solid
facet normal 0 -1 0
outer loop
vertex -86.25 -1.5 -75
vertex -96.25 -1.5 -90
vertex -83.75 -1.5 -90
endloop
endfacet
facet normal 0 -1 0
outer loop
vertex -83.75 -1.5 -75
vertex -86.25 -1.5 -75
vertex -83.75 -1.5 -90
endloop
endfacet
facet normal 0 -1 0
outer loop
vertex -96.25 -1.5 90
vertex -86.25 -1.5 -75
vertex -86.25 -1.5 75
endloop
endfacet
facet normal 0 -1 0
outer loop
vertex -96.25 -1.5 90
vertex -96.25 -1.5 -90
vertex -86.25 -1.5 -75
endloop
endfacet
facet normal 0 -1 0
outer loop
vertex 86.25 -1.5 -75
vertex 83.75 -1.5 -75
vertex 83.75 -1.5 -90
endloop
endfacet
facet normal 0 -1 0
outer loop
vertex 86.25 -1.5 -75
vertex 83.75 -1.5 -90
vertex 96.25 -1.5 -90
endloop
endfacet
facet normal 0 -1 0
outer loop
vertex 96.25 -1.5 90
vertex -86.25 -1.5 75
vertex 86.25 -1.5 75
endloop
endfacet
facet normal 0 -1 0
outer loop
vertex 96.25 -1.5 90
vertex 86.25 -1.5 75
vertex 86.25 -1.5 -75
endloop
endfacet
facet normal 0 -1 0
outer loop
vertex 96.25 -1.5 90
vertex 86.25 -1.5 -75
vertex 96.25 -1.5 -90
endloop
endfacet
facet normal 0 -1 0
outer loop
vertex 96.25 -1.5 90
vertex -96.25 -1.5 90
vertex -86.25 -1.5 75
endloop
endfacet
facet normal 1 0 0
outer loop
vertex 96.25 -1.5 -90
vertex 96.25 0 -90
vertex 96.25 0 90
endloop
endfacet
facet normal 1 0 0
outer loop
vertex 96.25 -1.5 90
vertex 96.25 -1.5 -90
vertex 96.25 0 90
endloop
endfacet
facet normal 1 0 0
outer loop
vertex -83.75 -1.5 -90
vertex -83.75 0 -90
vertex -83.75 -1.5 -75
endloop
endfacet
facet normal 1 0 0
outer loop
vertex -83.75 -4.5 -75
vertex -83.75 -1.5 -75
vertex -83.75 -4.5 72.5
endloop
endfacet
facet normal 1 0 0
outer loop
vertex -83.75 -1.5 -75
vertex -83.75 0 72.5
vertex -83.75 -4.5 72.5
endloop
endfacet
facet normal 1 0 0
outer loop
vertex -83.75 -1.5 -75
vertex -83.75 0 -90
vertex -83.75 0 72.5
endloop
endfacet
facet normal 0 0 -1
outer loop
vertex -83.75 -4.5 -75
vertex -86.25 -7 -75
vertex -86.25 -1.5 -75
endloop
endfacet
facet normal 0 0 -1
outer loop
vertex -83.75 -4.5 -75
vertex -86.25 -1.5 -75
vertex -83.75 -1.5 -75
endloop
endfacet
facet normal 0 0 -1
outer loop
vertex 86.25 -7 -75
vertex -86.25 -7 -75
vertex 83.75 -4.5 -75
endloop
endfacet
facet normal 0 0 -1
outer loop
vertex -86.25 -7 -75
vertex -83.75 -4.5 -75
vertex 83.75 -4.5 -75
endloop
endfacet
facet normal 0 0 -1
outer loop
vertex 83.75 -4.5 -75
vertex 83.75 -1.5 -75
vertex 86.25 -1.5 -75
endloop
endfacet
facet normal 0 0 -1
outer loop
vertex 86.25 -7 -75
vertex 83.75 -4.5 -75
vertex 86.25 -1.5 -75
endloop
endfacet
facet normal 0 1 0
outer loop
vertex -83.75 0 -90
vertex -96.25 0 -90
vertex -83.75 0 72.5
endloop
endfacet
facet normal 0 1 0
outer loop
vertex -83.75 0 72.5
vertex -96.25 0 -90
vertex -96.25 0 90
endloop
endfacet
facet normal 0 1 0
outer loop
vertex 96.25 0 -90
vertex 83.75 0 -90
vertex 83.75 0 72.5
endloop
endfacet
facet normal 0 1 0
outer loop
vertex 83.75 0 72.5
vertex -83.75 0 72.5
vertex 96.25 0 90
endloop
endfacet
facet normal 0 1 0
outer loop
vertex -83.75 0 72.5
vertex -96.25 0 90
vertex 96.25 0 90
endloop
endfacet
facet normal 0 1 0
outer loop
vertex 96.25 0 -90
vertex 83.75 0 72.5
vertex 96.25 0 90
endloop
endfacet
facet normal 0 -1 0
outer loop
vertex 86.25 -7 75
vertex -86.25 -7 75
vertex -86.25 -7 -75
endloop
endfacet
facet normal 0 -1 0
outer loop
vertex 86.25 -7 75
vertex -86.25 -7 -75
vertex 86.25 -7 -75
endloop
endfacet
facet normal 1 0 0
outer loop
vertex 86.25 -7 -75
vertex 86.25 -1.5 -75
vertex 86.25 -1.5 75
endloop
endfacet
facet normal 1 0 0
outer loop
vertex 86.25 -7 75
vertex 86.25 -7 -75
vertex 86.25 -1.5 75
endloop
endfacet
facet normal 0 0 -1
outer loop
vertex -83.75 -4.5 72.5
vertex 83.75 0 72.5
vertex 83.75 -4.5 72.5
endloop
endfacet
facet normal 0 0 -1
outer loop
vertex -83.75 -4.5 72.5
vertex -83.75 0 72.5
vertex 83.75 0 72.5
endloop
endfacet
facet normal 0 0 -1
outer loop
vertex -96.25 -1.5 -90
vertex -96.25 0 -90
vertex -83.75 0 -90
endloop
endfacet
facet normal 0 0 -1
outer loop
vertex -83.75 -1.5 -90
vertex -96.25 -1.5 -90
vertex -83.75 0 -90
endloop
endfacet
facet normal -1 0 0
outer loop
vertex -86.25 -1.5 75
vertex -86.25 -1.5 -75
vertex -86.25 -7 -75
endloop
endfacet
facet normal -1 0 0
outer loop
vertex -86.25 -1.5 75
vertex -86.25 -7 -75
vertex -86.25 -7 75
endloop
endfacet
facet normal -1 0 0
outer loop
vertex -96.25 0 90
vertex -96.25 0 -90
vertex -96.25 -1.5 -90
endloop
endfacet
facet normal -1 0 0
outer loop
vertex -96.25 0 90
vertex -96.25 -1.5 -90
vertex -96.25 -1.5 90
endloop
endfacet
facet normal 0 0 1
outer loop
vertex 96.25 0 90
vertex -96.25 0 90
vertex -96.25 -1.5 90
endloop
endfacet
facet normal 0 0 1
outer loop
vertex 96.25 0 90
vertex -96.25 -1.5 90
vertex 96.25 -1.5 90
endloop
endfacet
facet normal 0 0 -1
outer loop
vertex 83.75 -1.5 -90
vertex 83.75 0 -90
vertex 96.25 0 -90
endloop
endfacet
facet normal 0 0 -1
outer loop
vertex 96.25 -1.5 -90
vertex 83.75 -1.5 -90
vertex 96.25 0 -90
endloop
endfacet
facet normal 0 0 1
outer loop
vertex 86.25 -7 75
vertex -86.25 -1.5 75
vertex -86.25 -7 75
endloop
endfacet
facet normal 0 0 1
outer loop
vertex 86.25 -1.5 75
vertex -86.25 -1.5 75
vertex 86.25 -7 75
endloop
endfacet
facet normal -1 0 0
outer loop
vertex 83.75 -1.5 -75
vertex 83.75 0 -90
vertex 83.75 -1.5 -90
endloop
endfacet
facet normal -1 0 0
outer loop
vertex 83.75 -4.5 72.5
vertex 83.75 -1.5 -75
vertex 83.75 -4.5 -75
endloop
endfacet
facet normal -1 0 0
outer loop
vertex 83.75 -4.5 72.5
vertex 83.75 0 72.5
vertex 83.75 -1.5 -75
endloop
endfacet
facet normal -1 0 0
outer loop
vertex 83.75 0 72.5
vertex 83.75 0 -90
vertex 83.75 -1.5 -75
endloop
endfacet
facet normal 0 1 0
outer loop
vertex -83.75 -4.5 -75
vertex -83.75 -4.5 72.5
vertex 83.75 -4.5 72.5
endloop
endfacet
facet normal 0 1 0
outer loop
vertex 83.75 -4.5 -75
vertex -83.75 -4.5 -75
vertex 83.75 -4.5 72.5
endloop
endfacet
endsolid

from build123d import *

# Parameters (mm, degrees)
F0_W        = 192.5
F0_H        = 180
F1_DEPTH    = 1.5
F2_W        = 172.5
F2_H        = 150
F3_DEPTH    = 5.5
F4_T        = 2.5
F4_T3_DEPTH = 155
F4_T5_DEPTH = 177.5
F6_W        = 167.5
F6_H        = 4.5
F7_DEPTH    = 17.501


# Not quite as in the source:
# - a shell that OpenCascade refuses in one call is made with other operations: the cavity is built on its own and cut out


with BuildPart() as f1:
    # F0 (on Front) → F1 (new body)
    with BuildSketch(Plane.XZ):
        Rectangle(F0_W, F0_H)
    extrude(amount=F1_DEPTH)

    # F2 (on face) → F3 (join)
    with BuildSketch(Plane.XZ.offset(1.5)):
        Rectangle(F2_W, F2_H)
    extrude(amount=F3_DEPTH)

    # F4: shell of thickness 2.5, made by hand


with BuildPart() as f4_core1:
    # F4_t2: copy of F1
    add(f1.part)

    # the walls: a layer under each face that stays
    f4_faces = [f4_core1.faces().sort_by_distance(p)[0] for p in [
        (96.25, -0.75, 0),
        (0, -0.75, -90),
        (0, -0.75, 90),
        (-82.5, -1.5, -77.1428571429),
        (-96.25, -0.75, 0),
        (86.25, -4.25, 0),
        (0, -4.25, 75),
        (-86.25, -4.25, 0),
        (0, -4.25, -75),
        (0, -7, 0),
    ]]
    thicken(f4_faces, amount=-F4_T, mode=Mode.SUBTRACT)

    # F4_s4 → F4_t3 (cut)
    with BuildSketch(Plane.XY.offset(-77.5)):
        Polygon((86.275, -1.525), (86.25, 1), (83.75, 1), (83.75, -1.5), align=None)
        Polygon((-86.275, -1.525), (-86.25, 1), (-83.75, 1), (-83.75, -1.5), align=None)
    extrude(amount=F4_T3_DEPTH, mode=Mode.SUBTRACT)

    # F4_s6 → F4_t5 (cut)
    with BuildSketch(Plane.YZ.offset(-88.75)):
        Polygon((-1.525, 75.025), (1, 75), (1, 72.5), (-1.5, 72.5), align=None)
        Polygon((-1.525, -75.025), (1, -75), (1, -72.5), (-1.5, -72.5), align=None)
    extrude(amount=F4_T5_DEPTH, mode=Mode.SUBTRACT)


with BuildPart() as f1_1:
    add(f1.part)

    # what is left inside the walls is the cavity
    f4_cavity = [f4_core1.part.solids().sort_by_distance(p)[0] for p in [
        (0, -0.025, -24.166667),
    ]]
    add(f4_cavity, mode=Mode.SUBTRACT)

    # F6 (on face) → F7 (cut, through all)
    with BuildSketch(Plane(origin=(0, 0, -72.5), x_dir=(1, 0, 0), z_dir=(0, 0, -1))):
        with Locations((0, 2.25)):
            Rectangle(F6_W, F6_H)
    extrude(amount=F7_DEPTH, mode=Mode.SUBTRACT)


solid = f1_1.part
